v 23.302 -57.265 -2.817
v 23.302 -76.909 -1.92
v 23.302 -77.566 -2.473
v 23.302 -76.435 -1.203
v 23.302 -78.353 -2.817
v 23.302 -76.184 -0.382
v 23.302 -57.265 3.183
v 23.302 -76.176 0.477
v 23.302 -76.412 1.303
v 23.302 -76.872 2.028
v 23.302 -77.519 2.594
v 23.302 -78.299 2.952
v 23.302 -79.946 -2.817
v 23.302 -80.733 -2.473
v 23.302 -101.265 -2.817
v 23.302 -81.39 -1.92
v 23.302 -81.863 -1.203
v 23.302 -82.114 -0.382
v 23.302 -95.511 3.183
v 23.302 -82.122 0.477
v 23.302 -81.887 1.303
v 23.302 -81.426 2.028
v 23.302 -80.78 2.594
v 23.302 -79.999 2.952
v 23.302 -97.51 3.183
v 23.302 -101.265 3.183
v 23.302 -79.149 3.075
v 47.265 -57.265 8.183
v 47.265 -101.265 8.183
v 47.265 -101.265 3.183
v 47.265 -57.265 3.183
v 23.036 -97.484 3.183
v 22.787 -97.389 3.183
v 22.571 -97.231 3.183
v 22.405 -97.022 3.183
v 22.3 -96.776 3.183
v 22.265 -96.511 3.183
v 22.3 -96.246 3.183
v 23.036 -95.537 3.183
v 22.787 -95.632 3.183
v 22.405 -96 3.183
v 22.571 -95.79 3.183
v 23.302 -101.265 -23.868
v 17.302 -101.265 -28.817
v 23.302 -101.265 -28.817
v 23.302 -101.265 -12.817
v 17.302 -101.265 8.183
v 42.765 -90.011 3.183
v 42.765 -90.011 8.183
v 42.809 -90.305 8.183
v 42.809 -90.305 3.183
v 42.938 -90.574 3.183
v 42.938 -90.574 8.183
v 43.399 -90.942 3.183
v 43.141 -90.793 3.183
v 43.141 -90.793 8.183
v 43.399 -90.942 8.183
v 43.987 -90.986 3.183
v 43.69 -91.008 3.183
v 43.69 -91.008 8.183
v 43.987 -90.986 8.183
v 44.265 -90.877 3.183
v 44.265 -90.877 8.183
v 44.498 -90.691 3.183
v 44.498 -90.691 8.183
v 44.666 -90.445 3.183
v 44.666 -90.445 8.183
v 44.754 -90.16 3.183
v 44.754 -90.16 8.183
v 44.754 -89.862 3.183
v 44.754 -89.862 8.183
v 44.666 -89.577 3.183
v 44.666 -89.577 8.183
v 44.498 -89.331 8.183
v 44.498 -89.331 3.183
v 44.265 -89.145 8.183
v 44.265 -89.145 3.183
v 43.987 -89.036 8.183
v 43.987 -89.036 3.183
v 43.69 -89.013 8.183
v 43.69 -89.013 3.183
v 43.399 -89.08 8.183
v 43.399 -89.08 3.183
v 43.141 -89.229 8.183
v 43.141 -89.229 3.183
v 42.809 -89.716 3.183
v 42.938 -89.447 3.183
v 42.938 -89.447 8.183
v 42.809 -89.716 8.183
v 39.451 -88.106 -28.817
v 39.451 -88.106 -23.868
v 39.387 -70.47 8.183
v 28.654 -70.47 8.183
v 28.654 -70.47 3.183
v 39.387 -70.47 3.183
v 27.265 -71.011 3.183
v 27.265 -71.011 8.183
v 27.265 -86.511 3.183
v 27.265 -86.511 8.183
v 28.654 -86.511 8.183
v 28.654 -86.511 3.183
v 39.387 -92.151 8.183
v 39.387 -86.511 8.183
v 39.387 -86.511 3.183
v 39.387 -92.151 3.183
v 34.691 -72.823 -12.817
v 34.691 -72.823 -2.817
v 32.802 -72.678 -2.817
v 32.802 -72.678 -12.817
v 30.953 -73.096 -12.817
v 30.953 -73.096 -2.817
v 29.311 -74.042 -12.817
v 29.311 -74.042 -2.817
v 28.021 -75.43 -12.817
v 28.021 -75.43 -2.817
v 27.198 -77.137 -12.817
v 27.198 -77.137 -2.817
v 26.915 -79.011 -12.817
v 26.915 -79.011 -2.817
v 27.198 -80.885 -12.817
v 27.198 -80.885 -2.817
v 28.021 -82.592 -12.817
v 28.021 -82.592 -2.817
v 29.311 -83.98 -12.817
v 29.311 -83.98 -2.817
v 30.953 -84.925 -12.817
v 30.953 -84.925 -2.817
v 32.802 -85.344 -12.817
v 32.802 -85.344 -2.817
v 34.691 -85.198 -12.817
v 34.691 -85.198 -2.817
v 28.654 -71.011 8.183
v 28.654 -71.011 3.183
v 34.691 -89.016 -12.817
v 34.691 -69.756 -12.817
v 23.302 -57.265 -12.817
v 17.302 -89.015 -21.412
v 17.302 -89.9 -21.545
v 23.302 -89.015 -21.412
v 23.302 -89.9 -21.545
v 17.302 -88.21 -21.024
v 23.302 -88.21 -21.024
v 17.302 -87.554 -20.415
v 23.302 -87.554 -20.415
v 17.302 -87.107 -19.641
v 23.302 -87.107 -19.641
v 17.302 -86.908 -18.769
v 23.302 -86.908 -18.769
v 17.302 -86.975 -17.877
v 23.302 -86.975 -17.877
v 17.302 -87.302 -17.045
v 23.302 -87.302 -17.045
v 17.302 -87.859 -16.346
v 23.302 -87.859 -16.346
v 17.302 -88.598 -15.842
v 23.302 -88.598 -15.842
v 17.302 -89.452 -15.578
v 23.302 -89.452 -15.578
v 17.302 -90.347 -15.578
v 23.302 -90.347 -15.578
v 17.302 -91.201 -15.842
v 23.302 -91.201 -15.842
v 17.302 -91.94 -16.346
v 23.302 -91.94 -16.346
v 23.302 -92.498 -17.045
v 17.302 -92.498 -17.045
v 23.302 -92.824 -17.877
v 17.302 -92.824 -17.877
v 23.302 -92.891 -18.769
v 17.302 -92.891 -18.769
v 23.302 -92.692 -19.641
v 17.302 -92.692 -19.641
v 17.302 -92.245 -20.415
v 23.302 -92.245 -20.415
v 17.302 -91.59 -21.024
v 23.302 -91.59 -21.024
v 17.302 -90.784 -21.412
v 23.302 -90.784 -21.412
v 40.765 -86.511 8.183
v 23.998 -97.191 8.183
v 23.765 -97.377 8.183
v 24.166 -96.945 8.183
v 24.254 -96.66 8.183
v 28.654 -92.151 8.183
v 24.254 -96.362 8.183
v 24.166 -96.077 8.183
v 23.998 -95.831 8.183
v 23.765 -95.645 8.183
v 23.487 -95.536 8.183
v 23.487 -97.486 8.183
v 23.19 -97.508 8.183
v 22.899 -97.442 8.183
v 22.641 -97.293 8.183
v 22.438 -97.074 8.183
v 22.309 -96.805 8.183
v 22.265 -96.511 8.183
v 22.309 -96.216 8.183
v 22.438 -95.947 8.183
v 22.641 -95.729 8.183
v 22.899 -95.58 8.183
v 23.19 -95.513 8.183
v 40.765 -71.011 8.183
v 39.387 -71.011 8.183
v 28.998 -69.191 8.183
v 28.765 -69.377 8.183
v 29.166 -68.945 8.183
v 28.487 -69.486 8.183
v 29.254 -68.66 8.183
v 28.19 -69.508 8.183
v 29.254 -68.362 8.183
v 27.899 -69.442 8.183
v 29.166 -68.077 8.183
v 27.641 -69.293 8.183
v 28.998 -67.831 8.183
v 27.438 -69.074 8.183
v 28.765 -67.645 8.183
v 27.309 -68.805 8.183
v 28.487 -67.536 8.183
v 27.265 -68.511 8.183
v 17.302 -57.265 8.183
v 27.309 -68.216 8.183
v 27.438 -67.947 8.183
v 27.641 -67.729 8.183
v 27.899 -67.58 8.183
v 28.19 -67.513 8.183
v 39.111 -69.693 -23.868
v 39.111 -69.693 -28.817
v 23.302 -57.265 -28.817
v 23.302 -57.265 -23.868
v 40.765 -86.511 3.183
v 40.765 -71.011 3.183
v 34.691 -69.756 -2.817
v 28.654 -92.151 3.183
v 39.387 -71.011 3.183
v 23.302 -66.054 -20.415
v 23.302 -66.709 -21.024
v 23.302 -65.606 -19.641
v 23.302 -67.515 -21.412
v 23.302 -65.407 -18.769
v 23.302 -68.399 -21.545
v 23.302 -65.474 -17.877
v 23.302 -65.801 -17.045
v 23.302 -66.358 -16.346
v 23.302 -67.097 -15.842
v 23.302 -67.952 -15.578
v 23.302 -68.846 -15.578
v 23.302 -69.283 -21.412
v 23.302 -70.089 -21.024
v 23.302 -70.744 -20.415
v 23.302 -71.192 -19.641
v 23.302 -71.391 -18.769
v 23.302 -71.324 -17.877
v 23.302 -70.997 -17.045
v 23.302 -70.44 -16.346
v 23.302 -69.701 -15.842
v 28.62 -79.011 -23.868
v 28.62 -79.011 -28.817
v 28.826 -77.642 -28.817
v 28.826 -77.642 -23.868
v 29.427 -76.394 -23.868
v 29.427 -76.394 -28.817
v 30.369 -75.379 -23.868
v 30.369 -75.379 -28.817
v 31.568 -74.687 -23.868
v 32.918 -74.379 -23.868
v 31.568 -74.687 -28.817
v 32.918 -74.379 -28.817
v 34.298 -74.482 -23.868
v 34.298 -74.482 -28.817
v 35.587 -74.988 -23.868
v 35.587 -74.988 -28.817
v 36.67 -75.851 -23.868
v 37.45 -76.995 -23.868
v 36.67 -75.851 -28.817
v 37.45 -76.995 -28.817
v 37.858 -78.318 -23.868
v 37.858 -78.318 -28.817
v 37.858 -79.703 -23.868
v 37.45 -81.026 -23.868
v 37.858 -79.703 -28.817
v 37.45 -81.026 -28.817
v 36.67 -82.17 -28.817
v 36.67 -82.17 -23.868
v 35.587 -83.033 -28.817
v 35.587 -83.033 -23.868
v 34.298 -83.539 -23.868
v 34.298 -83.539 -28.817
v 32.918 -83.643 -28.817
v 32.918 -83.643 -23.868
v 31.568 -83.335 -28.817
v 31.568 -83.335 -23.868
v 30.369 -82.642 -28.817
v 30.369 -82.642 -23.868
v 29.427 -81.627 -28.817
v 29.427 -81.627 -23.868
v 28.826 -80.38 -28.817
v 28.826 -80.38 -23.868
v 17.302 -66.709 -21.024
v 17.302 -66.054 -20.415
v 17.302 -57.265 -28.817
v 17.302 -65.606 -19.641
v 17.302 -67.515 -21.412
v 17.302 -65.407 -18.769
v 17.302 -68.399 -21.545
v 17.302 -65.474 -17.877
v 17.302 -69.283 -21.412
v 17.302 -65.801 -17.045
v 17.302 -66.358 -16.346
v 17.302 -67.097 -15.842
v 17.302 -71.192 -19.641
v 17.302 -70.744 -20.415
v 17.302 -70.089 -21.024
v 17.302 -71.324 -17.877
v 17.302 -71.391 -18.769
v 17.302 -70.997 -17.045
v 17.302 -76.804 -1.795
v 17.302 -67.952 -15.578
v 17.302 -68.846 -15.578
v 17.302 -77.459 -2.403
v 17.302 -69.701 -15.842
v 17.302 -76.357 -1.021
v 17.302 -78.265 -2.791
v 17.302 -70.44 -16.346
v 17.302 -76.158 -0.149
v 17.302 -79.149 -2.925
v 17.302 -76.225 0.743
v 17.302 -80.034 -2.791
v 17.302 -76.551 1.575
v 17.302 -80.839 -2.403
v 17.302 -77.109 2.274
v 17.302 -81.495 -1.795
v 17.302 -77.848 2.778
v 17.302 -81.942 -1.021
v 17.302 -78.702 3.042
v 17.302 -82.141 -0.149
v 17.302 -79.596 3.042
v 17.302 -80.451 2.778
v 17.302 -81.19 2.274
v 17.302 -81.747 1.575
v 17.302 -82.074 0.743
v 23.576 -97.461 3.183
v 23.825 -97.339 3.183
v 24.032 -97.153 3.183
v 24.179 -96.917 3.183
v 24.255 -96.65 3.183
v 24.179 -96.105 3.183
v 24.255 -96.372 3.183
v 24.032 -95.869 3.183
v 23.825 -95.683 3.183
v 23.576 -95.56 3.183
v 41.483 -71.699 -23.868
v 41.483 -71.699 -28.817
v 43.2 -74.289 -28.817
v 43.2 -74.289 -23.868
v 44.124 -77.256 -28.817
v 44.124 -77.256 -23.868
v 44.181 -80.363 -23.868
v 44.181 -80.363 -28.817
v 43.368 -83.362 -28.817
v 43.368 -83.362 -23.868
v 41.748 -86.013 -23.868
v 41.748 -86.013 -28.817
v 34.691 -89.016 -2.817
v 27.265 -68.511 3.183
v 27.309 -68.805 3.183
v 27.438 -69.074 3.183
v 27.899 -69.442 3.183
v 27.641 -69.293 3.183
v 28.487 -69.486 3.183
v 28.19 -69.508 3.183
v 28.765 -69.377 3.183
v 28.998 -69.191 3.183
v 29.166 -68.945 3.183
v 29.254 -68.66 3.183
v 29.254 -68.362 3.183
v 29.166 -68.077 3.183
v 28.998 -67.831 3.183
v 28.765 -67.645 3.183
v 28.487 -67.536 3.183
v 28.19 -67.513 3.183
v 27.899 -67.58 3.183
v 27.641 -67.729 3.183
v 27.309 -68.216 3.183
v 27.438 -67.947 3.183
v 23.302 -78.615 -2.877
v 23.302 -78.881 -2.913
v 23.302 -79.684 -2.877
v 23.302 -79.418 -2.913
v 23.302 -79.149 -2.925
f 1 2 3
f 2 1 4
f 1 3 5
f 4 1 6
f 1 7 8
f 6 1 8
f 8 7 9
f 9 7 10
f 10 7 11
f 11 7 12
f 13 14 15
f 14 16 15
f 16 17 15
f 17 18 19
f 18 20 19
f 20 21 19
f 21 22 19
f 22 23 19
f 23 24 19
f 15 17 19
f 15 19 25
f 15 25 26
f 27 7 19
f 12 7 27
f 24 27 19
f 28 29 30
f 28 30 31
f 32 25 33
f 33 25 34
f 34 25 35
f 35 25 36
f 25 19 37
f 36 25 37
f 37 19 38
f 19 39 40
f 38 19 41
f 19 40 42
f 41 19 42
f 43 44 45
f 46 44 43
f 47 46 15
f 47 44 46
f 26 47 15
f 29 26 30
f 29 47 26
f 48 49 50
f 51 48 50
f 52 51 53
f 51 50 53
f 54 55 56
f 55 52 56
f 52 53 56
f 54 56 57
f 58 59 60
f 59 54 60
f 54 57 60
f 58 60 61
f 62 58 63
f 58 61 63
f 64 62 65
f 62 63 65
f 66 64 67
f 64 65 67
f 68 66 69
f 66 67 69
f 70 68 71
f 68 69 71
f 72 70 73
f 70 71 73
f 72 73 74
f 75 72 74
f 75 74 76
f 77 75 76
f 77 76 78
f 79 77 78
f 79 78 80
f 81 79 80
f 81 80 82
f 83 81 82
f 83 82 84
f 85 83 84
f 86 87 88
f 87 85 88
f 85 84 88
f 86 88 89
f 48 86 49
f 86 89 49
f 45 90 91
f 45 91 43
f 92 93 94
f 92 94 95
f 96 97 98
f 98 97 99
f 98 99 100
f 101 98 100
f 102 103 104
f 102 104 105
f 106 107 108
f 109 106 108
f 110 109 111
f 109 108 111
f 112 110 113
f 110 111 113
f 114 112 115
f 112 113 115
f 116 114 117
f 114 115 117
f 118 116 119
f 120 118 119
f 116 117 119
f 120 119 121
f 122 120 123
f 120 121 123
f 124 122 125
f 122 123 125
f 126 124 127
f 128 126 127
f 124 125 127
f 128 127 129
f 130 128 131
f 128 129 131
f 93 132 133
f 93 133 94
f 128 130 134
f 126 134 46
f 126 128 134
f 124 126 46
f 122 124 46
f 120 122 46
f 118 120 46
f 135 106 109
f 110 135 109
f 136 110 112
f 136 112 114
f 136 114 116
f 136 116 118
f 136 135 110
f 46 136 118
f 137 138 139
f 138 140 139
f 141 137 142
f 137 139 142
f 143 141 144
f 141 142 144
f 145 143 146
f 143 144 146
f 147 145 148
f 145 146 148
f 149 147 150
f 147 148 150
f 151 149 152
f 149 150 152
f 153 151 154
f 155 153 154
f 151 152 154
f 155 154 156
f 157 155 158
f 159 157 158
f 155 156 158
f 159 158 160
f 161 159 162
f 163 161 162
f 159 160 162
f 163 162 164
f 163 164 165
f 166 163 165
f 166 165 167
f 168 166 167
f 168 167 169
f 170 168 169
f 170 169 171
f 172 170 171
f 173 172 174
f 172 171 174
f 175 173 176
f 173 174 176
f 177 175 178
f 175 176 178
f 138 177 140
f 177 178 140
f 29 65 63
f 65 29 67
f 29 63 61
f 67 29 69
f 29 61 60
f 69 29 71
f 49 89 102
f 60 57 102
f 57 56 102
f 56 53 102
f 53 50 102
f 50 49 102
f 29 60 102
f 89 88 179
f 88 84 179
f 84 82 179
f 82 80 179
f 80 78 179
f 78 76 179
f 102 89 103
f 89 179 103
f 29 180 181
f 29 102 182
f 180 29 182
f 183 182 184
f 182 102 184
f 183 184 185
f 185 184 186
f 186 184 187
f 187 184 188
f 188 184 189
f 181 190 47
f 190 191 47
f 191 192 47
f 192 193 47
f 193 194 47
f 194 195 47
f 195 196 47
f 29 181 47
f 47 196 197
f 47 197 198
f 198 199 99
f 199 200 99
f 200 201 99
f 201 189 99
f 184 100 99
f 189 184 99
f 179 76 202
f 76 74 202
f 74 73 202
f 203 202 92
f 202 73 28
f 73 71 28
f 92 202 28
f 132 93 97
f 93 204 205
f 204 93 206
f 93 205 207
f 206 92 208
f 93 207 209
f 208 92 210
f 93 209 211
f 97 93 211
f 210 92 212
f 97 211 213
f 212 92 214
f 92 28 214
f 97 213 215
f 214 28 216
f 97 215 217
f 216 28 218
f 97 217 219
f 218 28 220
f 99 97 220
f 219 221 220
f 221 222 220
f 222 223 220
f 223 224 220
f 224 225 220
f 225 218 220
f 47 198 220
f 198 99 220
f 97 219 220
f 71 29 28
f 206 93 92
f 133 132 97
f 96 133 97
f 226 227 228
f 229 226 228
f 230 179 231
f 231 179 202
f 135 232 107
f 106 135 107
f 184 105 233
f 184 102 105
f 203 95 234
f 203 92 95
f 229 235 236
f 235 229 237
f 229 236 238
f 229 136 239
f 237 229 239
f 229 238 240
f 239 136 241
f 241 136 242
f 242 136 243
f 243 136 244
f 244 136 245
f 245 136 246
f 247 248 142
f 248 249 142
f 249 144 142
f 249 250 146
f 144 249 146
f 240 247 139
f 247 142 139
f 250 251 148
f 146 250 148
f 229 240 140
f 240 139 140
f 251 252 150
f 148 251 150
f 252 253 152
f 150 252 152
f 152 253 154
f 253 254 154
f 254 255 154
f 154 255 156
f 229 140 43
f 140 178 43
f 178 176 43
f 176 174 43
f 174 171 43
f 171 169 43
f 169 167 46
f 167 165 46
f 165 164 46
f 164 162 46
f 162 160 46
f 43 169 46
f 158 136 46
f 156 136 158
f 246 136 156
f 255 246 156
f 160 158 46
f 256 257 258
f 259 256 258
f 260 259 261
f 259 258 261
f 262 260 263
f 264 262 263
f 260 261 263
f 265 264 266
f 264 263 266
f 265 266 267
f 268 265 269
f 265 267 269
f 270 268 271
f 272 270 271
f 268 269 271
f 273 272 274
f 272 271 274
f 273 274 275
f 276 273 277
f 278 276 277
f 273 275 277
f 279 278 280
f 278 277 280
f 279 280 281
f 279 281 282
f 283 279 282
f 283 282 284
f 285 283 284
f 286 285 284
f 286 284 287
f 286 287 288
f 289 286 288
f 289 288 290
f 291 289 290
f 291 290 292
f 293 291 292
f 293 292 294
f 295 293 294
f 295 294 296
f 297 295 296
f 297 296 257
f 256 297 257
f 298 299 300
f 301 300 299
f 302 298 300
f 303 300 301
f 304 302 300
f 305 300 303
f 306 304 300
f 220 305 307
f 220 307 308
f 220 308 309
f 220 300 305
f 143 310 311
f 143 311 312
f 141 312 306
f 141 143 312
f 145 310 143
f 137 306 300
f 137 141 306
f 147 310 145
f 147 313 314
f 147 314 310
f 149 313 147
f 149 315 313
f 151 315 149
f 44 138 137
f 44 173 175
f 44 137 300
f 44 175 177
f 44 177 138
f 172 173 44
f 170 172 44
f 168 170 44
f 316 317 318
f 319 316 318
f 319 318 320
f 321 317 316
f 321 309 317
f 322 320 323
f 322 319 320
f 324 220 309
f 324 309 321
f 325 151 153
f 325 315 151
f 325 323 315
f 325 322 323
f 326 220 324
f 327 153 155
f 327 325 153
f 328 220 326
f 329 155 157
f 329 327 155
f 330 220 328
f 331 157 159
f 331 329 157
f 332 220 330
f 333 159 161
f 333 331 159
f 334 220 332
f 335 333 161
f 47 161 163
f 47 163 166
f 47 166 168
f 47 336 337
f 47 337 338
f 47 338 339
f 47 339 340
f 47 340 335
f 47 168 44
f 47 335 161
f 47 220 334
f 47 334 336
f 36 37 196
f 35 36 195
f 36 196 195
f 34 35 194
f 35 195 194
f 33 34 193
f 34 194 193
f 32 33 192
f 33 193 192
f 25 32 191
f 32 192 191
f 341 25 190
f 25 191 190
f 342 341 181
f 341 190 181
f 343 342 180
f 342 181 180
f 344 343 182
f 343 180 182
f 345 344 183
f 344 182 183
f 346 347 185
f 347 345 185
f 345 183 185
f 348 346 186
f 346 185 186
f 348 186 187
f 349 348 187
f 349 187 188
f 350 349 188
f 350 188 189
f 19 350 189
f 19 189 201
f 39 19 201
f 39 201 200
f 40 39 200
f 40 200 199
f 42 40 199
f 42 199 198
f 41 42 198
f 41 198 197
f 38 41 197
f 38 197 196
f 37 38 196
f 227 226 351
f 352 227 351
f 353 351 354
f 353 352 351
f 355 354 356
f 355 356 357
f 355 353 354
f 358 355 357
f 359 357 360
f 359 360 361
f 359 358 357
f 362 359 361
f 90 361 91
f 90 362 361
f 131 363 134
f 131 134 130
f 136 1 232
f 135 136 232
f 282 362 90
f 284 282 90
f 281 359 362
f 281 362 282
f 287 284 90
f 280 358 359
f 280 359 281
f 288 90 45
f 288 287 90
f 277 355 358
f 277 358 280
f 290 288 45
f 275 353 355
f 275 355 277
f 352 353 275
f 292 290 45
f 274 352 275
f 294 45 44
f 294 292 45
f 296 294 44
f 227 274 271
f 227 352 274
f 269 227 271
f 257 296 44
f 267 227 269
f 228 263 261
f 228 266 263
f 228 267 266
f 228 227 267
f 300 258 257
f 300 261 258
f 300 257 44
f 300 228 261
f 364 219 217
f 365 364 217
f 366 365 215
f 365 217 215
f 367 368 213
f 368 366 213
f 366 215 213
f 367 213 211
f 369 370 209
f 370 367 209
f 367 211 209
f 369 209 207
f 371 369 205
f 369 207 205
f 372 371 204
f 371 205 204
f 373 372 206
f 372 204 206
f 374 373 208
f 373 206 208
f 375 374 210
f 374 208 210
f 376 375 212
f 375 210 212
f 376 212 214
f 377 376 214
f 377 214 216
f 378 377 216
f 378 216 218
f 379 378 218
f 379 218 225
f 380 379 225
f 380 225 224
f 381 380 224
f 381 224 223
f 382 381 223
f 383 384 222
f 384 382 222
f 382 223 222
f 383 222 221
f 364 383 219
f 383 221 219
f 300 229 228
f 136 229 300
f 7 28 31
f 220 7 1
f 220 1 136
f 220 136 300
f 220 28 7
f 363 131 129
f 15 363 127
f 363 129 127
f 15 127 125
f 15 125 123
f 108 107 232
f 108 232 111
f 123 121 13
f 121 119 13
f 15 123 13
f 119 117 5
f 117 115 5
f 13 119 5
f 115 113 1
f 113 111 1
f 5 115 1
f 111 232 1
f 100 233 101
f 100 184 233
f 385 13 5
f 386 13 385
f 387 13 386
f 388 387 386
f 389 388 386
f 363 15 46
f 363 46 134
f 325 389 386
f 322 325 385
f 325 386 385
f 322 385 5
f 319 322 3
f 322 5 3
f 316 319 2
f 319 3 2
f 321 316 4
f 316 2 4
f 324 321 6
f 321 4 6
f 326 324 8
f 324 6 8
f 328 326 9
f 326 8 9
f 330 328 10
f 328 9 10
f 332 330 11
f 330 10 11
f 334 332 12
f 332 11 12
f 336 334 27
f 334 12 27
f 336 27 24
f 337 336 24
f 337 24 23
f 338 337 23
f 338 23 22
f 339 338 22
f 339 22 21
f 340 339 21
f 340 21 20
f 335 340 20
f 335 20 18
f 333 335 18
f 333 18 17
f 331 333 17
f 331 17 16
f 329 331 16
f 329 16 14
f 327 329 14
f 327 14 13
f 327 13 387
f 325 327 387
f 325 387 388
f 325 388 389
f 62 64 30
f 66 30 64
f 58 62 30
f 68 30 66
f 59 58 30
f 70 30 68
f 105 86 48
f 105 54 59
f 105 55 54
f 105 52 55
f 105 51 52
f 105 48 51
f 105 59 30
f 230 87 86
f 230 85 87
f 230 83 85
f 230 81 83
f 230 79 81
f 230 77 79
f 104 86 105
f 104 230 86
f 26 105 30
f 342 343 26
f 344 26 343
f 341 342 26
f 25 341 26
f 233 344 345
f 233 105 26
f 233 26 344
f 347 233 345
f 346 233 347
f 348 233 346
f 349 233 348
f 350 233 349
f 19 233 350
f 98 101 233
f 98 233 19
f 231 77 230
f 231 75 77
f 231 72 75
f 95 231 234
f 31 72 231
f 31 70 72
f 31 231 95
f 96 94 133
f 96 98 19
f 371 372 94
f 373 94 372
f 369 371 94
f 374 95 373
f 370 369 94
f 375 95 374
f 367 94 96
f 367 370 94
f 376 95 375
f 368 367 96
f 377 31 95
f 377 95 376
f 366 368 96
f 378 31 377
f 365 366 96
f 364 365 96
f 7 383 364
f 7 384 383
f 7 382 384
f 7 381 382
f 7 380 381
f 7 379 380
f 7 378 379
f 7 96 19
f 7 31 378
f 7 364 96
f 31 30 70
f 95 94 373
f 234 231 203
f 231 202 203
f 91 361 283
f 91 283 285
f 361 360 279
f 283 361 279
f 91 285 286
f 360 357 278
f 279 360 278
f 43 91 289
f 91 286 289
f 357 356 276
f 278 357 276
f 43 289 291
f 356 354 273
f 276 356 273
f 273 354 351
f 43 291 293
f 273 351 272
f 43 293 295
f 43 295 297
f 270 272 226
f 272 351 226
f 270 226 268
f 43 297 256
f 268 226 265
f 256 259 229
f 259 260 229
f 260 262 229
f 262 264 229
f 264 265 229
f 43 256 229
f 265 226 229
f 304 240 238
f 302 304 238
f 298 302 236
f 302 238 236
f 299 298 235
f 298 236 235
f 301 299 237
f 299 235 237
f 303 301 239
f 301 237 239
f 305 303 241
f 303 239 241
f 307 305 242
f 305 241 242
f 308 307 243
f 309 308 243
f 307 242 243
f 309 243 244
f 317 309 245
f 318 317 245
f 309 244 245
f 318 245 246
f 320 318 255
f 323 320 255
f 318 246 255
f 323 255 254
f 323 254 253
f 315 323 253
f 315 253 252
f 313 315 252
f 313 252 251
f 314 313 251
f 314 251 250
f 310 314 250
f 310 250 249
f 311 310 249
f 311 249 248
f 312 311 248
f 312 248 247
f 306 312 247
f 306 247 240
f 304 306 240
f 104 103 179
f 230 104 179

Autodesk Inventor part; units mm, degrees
ref_plane "YZ Plane" through (0, 0, 0) normal (1, 0, 0) x (0, 1, 0)
ref_plane "XZ Plane" through (0, 0, 0) normal (0, 1, 0) x (-1, 0, 0)
ref_plane "Work Plane1" through (29.8677, -69.0107, 8.183) normal (0, 0, -1) x (-1, 0, 0)
sketch "Sketch1" plane through (29.8677, -69.0107, 8.183) normal (0, 0, -1) x (-1, 0, 0)
  line L0 (2.603, -2) -> (2.603, -17.5) projected
  line L1 (2.603, -17.5) -> (-10.897, -17.5) projected
  line L2 (-10.897, -17.5) -> (-10.897, -2) projected
  line L3 (-10.897, -2) -> (2.603, -2) projected
  circle A0 centre (6.603, -27.5) radius 1 projected
  circle A1 centre (-13.897, -21) radius 1 projected
  circle A2 centre (1.603, 0.5) radius 1 projected
  arc A3 (9.303, -26.8555) -> (8.303, -25.8555) centre (8.303, -26.8555) ccw projected
  line L4 (8.303, -25.8555) -> (5.5653, -25.8555) projected
  arc A4 (4.5653, -24.8555) -> (5.5653, -25.8555) centre (5.5653, -24.8555) ccw projected
  line L5 (4.5653, -24.8555) -> (4.5653, 2) projected
  arc A5 (4.5653, 2) -> (3.5653, 3) centre (3.5653, 2) ccw projected
  line L6 (3.5653, 3) -> (1, 3) projected
  arc A6 (1, 3) -> (0, 2) centre (1, 2) ccw projected
  line L7 (0, 2) -> (0, 1) projected
  arc A7 (-1, 0) -> (0, 1) centre (-1, 1) ccw projected
  line L8 (-1, 0) -> (-12.5347, 0) projected
  line L9 (-12.5347, 0) -> (-12.5347, -18.4723) projected
  arc A8 (-13.5347, -19.4723) -> (-12.5347, -18.4723) centre (-13.5347, -18.4723) ccw projected
  line L10 (-13.5347, -19.4723) -> (-15.397, -19.4723) projected
  arc A9 (-15.397, -19.4723) -> (-16.397, -20.4723) centre (-15.397, -20.4723) ccw projected
  line L11 (-16.397, -20.4723) -> (-16.397, -30) projected
  line L12 (-16.397, -30) -> (9.303, -30) projected
  line L13 (9.303, -30) -> (9.303, -26.8555) projected
  line L14 (-17.397, 11.7453) -> (12.5653, 11.7453)
  line L15 (12.5653, 11.7453) -> (12.5653, -32.2547)
  line L16 (12.5653, -32.2547) -> (-17.397, -32.2547)
  line L17 (-17.397, -32.2547) -> (-17.397, 11.7453)
  line L18 (1.2141, -1.4589) -> (-9.519, -1.4589)
  line L19 (-9.519, -1.4589) -> (-9.519, -23.1404)
  line L20 (-9.519, -23.1404) -> (1.2141, -23.1404)
  line L21 (1.2141, -23.1404) -> (1.2141, -1.4589)
  ellipse E0 centre (-3.397, -10.2547) end of major axis (-6.4323, -10.2547) minor radius 3.0277 projected
  point P0 (29.8677, 69.0107)
  dimension "d0" = 8
  dimension "d1" = 1
  dimension "d13" = 22
  dimension "d14" = 22
extrude "Extrusion1" add sketch "Sketch1" along normal blind 5 contours L13 L12 L11 A9 L10 A8 L9 L8 A7 L7 A6 L6 A5 L5 A4 L4 A3 | L14 L15 L16 L17
sketch "Sketch2" plane through (29.8677, -69.0107, 3.183) normal (0, 0, -1) x (-1, 0, 0)
  line L0 (12.5653, 11.7453) -> (-17.397, 11.7453) projected
  line L1 (-17.397, 11.7453) -> (-17.397, -32.2547) projected
  line L2 (-17.397, -32.2547) -> (12.5653, -32.2547) projected
  line L3 (12.5653, -32.2547) -> (12.5653, 11.7453) projected
  circle A0 centre (6.603, -27.5) radius 1 projected
  circle A1 centre (-13.897, -21) radius 1 projected
  circle A2 centre (1.603, 0.5) radius 1 projected
  line L4 (1.2141, -17.5) -> (1.2141, -23.1404) projected
  line L5 (1.2141, -23.1404) -> (-9.519, -23.1404) projected
  line L6 (-9.519, -23.1404) -> (-9.519, -17.5) projected
  line L7 (-9.519, -17.5) -> (-10.897, -17.5) projected
  line L8 (-10.897, -17.5) -> (-10.897, -2) projected
  line L9 (-10.897, -2) -> (-9.519, -2) projected
  line L10 (-9.519, -2) -> (-9.519, -1.4589) projected
  line L11 (-9.519, -1.4589) -> (1.2141, -1.4589) projected
  line L12 (1.2141, -1.4589) -> (1.2141, -2) projected
  line L13 (1.2141, -2) -> (2.603, -2) projected
  line L14 (2.603, -2) -> (2.603, -17.5) projected
  line L15 (2.603, -17.5) -> (1.2141, -17.5) projected
  line L16 (-17.397, 11.7453) -> (12.5653, 11.7453) projected
  line L17 (12.5653, -32.2547) -> (-17.397, -32.2547) projected
  line L18 (12.5653, 11.7453) -> (6.5653, 11.7453)
  line L19 (6.5653, 11.7453) -> (6.5653, -32.2547)
  line L20 (6.5653, -32.2547) -> (12.5653, -32.2547)
  line L21 (12.5653, -32.2547) -> (12.5653, 11.7453)
  point P0 (29.8677, 69.0107)
  dimension "d6" = 6
extrude "Extrusion2" add sketch "Sketch2" along normal blind 32 contours L3 L2 L19 A0 L0 | A0 L19 picked at (6.9324, -27.235)
sketch "Sketch3" plane through (29.8677, -69.0107, -28.817) normal (0, 0, -1) x (-1, 0, 0)
  circle A0 centre (-3.397, -10) radius 4.445 projected
  circle A1 centre (-3.397, -10) radius 4.645
  line L0 (12.5653, 11.7453) -> (12.5653, -32.2547) projected
  line L1 (12.5653, -32.2547) -> (12.5653, 11.7453) projected
  line L2 (12.5653, 11.7453) -> (6.5653, 11.7453) projected
  line L3 (6.5653, 11.7453) -> (6.5653, -32.2547) projected
  line L4 (6.5653, -32.2547) -> (12.5653, -32.2547) projected
  line L5 (12.5653, -32.2547) -> (12.5653, 11.7453) projected
  line L6 (6.5653, 11.7453) -> (-17.397, 11.7453) projected
  line L7 (-9.2429, -0.682) -> (6.5653, 11.7453)
  line L8 (-9.5834, -19.0955) -> (6.5653, -32.2547)
  line L9 (6.5653, 11.7453) -> (6.5653, -5.3362)
  line L10 (6.5653, -14.6638) -> (6.5653, -32.2547)
  arc A2 (-9.2429, -0.682) -> (-9.5834, -19.0955) centre (-3.397, -10) ccw
  arc A3 (6.5653, -14.6638) -> (6.5653, -5.3362) centre (-3.397, -10) ccw
  point P0 (29.8677, 69.0107)
  dimension "d9" = 0.2
ref_plane "Work Plane2" through (26.9102, -85.3653, -23.8679) normal (0, 0, -1) x (0, 1, 0)
extrude "Extrusion3" add sketch "Sketch3" against normal up to surface (4.9491 mm away) contours L0 L4 L3 A3 L2 | L3 L8 A2 L7 | A3 L3
ref_plane "Work Plane3" through (29.8677, -69.0107, -2.817) normal (0, 0, -1) x (-1, 0, 0)
sketch "Sketch4" plane through (29.8677, -69.0107, -2.817) normal (0, 0, -1) x (-1, 0, 0)
  circle A0 centre (-3.397, -10) radius 6.35 projected
  line L0 (6.5653, -32.2547) -> (6.5653, 11.7453) projected
  line L1 (6.5653, -32.2547) -> (-4.8237, -20.0055)
  line L2 (-4.8237, -20.0055) -> (-4.8237, -16.1877)
  line L3 (12.5653, -32.2547) -> (-17.397, -32.2547) projected
  line L4 (6.5653, 11.7453) -> (-4.8237, -0.7453)
  line L5 (-4.8237, -0.7453) -> (-4.8237, -3.8123)
  point P0 (29.8677, 69.0107)
extrude "Extrusion4" add sketch "Sketch4" along normal blind 10 contours A0 L5 L4 L0 L1 L2
sketch "Sketch5" plane through (23.3024, -101.2655, -23.8679) normal (1, 0, 0) x (0, 0, -1)
  line L0 (-21.0509, 0) -> (-21.0509, 44) projected
  line L1 (-27.0509, 44) -> (-21.0509, 44) projected
  line L2 (-27.0509, 0) -> (-27.0509, 3.7554) projected
  line L3 (-27.0509, 0) -> (-21.0509, 0) projected
  line L4 (-11.0509, 44) -> (-11.0509, 0) projected
  line L5 (-11.0509, 0) -> (0, 0) projected
  line L6 (-11.0509, 44) -> (0, 44) projected
  line L7 (-5.3231, 32.8665) -> (-5.3231, 11.3659)
  line L8 (-5.3231, 11.3659) -> (-23.9432, 22.1162)
  line L9 (-23.9432, 22.1162) -> (-5.3231, 32.8665)
  circle A0 centre (-23.9432, 22.1162) radius 3
  circle A1 centre (-5.3231, 32.8665) radius 3
  circle A2 centre (-5.3231, 11.3659) radius 3
  line L10 (-27.0509, 0) -> (-21.0509, 0) projected
  line L11 (-27.0509, 44) -> (-21.0509, 44) projected
  line L12 (-21.0509, 0) -> (-21.0509, 44) projected
  line L13 (-27.0509, 5.754) -> (-27.0509, 44) projected
  line L14 (-27.0509, 5.754) -> (-27.0509, 3.7554) projected
  line L15 (-27.0509, 0) -> (-27.0509, 3.7554) projected
  line L16 (-27.0509, 5.754) -> (-27.0509, 44) projected
  line L17 (-27.0509, 5.754) -> (-27.0509, 3.7554) projected
  line L18 (0, 0) -> (0, 44) projected
  point P0 (-23.8679, 101.2655)
  point P1 (-11.5298, 22.1162)
  dimension "d18" = 0
  dimension "d19" = 6
  dimension "d20" = 6
  dimension "d21" = 6
extrude "Extrusion5" cut sketch "Sketch5" against normal blind 10 contours A0 L8 L9 L0 | L0 A0 | A0 L9 L8 | A2 L7 L8 | L8 L7 A2 | A1 L7 L9 | L9 L7 A1
properties part number "30_cellSTORM_fiberbase_base_v3"
